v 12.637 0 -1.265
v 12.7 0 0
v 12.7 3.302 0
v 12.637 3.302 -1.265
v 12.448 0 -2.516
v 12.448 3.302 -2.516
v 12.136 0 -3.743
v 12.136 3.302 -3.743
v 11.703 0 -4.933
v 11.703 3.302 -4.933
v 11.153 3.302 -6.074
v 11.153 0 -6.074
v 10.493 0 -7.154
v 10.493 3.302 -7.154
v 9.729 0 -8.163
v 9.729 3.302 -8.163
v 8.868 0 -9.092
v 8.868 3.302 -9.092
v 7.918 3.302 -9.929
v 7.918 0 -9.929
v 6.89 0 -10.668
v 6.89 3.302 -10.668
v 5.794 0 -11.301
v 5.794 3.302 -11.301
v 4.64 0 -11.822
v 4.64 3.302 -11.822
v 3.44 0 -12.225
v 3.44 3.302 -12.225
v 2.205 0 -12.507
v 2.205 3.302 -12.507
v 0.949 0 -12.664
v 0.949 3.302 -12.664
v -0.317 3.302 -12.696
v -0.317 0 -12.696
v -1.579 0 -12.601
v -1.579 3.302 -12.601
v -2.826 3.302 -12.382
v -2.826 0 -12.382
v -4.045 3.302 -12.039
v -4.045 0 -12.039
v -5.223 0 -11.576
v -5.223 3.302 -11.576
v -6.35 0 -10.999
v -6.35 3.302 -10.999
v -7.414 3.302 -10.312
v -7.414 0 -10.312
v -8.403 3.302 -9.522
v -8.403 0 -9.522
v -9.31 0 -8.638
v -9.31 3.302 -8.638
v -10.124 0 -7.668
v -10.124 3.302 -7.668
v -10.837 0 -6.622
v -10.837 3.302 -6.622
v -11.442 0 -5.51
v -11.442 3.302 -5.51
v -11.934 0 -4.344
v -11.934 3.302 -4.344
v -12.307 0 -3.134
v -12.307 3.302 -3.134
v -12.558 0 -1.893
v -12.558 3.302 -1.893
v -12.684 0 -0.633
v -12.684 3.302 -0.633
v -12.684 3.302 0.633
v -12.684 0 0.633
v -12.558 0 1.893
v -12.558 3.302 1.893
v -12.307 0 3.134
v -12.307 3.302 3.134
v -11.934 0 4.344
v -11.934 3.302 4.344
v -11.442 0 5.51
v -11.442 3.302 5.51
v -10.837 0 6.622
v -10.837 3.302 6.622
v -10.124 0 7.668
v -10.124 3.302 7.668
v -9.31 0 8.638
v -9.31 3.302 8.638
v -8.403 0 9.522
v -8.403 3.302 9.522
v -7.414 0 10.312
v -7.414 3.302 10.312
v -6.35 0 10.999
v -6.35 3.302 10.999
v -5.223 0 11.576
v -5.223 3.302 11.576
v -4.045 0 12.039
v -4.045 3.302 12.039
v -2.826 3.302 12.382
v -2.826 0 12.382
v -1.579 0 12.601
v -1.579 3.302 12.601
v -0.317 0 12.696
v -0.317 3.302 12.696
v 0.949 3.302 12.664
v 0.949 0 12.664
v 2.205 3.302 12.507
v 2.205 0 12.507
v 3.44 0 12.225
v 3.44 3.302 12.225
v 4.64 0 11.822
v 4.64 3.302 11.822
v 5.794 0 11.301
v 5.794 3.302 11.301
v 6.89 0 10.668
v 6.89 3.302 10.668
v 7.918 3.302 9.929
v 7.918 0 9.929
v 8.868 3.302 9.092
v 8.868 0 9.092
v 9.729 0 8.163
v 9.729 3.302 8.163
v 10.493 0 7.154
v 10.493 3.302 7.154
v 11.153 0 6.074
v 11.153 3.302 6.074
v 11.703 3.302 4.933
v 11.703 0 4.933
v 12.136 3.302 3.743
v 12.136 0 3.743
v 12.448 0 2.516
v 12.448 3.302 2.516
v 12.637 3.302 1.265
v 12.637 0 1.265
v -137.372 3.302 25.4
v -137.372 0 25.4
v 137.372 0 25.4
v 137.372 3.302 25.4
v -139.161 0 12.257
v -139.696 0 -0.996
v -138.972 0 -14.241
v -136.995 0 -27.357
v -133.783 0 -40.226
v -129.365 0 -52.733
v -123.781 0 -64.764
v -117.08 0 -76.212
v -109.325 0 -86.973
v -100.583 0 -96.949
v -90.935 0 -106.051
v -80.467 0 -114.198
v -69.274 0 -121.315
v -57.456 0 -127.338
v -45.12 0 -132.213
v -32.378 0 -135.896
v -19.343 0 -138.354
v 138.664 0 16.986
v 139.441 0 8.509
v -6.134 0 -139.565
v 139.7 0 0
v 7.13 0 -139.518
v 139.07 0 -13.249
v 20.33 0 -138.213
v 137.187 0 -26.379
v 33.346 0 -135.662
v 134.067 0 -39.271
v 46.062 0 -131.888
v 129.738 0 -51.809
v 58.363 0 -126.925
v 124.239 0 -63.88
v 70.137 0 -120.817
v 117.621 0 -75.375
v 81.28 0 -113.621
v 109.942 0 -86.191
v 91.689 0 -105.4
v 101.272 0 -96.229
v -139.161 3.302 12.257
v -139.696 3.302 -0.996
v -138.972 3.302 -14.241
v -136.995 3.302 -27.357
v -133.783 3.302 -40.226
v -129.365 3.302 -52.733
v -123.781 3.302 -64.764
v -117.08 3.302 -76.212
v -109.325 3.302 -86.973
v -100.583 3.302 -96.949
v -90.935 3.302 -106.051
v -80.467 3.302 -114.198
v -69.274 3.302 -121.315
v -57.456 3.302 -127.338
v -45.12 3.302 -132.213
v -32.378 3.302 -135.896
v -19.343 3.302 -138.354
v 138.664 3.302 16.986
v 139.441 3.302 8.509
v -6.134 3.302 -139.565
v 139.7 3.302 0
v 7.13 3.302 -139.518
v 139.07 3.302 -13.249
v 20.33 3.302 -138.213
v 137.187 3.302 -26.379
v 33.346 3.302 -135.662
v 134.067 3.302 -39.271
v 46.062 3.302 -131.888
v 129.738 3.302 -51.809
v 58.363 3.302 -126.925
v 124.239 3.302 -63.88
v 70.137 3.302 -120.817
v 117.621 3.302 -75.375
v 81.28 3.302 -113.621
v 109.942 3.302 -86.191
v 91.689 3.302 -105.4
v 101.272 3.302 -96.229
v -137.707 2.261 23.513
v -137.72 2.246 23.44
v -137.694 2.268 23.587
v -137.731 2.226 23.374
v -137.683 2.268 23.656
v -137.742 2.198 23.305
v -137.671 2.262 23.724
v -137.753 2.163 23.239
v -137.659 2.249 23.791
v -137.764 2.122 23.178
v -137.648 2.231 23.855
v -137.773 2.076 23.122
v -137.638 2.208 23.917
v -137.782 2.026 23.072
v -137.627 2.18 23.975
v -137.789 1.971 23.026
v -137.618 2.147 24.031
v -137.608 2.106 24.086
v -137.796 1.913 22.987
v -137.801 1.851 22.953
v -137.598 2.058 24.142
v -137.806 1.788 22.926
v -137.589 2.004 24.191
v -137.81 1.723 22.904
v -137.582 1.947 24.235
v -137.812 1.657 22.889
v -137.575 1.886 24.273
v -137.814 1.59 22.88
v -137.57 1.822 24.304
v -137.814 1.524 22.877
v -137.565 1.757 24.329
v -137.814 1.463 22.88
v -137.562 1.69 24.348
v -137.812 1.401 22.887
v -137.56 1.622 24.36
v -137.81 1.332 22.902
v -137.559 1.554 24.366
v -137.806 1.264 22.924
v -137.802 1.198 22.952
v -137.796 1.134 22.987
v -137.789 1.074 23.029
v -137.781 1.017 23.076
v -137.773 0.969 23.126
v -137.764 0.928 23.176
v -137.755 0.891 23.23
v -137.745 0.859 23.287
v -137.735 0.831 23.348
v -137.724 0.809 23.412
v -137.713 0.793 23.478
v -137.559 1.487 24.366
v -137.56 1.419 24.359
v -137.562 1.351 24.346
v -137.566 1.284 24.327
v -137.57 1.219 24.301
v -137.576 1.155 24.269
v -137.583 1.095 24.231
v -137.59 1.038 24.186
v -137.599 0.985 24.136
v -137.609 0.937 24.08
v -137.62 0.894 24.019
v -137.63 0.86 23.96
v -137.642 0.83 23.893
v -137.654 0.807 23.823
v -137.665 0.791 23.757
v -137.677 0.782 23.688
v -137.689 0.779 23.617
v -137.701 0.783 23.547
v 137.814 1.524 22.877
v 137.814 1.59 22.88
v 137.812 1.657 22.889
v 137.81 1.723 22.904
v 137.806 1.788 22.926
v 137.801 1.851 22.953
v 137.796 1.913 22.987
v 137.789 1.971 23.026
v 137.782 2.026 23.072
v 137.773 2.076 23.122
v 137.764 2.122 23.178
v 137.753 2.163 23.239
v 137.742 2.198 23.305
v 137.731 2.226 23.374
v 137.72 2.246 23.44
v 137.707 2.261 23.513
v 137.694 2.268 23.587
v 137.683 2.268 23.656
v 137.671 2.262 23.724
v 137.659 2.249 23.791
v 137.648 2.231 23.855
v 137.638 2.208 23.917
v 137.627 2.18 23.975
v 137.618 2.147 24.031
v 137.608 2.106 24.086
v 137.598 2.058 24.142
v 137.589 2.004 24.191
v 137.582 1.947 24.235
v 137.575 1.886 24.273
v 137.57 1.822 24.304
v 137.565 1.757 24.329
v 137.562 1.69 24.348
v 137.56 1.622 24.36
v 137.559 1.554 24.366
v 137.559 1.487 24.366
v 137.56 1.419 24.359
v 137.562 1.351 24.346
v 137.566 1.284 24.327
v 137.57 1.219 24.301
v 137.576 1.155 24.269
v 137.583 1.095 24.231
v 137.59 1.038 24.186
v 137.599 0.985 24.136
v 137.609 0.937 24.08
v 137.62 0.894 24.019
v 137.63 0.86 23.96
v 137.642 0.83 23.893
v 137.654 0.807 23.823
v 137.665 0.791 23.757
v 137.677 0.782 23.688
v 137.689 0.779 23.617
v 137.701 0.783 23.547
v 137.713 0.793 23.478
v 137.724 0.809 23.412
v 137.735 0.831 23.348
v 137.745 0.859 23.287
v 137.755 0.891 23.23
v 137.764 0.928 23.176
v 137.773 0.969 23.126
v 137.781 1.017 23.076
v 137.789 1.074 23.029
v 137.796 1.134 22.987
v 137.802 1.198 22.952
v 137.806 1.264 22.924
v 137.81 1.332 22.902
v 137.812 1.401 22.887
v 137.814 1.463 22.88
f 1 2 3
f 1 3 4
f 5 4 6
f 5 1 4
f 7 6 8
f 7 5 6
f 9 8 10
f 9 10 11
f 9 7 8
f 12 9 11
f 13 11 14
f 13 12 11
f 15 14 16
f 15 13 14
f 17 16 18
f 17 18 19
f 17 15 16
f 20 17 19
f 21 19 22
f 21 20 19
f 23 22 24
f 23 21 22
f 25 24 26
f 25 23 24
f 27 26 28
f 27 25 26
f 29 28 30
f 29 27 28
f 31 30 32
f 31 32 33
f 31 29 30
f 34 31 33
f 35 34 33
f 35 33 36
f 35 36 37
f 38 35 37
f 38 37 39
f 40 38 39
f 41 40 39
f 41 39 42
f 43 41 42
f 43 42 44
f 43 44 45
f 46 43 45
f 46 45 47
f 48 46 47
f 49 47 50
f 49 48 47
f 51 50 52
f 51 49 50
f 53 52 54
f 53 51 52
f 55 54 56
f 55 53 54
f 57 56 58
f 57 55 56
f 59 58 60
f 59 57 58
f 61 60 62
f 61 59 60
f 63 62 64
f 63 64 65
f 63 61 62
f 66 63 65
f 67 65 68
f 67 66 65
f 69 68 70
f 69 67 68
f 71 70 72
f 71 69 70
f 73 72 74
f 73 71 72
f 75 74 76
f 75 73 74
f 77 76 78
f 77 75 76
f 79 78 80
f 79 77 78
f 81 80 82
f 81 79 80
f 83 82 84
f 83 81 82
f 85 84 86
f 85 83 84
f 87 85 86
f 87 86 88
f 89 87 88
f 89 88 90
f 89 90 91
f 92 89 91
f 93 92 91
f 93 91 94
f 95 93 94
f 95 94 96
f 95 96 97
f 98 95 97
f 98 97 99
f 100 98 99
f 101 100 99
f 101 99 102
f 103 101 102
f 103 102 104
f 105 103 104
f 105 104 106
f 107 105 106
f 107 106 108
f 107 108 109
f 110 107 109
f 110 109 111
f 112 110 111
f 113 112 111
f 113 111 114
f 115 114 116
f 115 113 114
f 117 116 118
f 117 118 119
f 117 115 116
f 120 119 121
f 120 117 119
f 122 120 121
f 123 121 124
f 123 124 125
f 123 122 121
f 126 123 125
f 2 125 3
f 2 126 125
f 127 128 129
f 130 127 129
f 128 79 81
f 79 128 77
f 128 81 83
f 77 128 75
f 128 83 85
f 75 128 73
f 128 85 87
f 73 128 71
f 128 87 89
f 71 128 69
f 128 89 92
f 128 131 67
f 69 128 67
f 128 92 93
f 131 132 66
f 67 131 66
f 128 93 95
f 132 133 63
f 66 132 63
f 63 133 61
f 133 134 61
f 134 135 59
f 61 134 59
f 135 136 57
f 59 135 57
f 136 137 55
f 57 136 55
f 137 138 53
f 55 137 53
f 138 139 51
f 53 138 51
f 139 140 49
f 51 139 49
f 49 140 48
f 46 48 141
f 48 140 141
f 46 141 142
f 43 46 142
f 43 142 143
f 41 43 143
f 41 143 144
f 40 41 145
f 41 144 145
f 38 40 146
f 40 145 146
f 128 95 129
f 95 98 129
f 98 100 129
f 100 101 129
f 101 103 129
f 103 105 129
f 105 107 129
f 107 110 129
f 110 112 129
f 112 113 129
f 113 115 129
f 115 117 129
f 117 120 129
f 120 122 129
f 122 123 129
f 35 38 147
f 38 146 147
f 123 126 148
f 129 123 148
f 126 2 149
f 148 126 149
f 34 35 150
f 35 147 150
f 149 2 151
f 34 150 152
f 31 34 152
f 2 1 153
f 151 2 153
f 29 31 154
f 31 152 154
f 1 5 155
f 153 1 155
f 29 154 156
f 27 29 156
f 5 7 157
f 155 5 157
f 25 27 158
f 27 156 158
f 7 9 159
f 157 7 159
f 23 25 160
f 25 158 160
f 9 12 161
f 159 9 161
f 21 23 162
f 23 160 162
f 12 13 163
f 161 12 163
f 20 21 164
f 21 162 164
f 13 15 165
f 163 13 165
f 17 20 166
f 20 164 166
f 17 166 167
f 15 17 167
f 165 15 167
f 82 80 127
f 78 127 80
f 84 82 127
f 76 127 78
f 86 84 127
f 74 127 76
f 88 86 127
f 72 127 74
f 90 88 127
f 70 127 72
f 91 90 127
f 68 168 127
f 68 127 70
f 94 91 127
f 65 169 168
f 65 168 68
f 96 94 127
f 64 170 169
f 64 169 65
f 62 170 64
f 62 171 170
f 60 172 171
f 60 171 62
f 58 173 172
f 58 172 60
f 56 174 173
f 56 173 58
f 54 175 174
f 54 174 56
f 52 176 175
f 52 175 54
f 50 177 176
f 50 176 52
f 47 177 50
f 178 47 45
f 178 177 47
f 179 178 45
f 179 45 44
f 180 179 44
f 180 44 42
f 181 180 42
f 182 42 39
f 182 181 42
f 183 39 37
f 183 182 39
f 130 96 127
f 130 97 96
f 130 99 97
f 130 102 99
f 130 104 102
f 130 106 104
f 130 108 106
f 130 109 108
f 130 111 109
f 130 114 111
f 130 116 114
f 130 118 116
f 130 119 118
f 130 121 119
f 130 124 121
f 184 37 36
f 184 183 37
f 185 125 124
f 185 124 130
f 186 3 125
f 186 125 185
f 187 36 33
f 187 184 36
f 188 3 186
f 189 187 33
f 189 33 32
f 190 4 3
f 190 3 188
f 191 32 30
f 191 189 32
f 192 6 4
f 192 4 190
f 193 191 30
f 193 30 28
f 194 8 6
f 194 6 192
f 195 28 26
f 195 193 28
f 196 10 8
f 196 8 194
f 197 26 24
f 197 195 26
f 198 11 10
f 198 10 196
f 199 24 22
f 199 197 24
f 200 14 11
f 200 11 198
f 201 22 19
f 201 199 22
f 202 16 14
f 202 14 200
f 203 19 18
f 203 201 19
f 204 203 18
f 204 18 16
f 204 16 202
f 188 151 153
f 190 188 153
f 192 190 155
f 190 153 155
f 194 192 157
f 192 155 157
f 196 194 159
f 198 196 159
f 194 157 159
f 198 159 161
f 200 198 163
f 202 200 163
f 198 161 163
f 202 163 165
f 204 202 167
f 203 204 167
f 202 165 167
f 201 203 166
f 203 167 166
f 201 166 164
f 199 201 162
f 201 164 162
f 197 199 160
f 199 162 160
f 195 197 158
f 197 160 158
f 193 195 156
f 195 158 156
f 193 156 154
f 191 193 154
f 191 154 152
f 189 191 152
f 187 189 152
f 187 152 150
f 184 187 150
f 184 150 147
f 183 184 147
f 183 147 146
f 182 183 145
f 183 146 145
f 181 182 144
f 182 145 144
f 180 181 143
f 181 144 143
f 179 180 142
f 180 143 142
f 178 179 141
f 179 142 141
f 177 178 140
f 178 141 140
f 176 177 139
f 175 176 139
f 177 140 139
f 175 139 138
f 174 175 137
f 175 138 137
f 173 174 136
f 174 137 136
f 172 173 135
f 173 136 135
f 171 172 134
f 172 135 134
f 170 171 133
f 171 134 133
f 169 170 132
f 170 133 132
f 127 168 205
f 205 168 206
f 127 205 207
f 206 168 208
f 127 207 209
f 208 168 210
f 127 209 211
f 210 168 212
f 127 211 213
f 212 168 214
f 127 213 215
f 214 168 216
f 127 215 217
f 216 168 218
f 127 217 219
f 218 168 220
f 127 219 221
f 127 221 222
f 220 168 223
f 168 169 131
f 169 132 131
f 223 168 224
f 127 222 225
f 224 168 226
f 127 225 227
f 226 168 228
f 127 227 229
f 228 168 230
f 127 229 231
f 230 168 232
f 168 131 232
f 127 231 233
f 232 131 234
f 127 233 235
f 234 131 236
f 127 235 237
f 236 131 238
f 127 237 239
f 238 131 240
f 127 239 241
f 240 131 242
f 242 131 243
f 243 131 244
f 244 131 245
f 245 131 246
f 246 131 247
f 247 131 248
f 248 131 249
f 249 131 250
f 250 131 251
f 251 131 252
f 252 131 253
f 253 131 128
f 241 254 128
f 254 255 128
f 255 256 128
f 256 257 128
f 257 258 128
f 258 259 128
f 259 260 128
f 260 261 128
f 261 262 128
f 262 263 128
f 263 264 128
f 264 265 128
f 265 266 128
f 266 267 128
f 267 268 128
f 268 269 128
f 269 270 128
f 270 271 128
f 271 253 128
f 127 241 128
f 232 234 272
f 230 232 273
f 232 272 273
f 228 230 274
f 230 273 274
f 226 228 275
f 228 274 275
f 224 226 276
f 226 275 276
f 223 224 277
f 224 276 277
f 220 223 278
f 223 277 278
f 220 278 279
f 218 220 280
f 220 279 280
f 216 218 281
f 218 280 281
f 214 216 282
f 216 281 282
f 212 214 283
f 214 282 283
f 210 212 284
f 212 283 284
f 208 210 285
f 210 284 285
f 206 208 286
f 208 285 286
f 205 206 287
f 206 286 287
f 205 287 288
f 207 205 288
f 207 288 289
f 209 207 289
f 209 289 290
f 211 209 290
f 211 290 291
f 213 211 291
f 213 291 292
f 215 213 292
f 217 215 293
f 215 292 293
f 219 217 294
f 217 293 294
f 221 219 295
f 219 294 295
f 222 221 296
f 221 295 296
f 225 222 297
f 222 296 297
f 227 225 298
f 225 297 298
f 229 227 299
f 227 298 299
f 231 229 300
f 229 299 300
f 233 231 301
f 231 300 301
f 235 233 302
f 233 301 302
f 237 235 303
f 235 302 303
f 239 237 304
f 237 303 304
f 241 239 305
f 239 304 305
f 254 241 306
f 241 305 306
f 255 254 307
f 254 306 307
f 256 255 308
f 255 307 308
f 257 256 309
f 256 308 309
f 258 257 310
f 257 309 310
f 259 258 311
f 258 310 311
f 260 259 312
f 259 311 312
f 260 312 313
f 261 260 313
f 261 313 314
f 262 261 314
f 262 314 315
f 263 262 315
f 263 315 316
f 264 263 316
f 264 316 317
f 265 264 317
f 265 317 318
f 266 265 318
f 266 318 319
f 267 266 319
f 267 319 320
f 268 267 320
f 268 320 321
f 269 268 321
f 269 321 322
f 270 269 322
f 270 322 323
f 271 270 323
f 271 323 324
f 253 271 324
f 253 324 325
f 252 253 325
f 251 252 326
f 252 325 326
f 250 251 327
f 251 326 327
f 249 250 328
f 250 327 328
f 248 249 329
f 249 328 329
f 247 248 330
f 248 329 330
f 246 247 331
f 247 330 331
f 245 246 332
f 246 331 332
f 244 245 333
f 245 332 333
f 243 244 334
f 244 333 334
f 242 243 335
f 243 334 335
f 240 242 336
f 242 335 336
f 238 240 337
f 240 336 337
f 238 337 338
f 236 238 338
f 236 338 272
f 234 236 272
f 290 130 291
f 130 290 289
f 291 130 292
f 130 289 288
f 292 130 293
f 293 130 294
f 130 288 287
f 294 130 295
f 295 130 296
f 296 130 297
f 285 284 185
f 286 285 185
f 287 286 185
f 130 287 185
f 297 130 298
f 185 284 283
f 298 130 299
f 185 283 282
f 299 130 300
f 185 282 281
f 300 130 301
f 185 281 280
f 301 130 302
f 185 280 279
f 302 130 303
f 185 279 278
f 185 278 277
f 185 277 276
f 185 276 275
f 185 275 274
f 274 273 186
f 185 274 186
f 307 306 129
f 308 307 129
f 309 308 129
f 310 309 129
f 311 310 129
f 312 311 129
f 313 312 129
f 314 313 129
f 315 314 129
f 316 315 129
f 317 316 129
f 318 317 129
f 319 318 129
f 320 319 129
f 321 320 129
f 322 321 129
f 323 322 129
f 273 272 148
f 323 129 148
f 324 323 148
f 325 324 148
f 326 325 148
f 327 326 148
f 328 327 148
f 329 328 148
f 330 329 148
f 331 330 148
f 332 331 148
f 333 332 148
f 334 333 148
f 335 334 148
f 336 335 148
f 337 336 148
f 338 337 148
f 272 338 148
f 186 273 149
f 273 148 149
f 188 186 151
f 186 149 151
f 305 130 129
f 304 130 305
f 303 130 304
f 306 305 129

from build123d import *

# Parameters (mm, degrees)
SKETCH1_R               = 12.7
BOSS_EXTRUDE2_DEPTH     = 3.302
SKETCH4_R               = 0.744786443
CUT_EXTRUDE4_DEPTH      = 140.7
CUT_EXTRUDE4_DEPTH_BACK = 140.7


with BuildPart() as part:
    # Sketch1 → Boss-Extrude2 (new body)
    with BuildSketch(Plane(origin=(0, 0, 0), x_dir=(1, 0, 0), z_dir=(0, 1, 0))):
        with BuildLine():
            ThreePointArc((139.7, 0), (-12.753253462, 139.116657975), (-137.371503595, -25.4))
            Line((-137.371503595, -25.4), (137.371503595, -25.4))
            ThreePointArc((137.371503595, -25.4), (139.116657975, -12.753253462), (139.7, 0))
        make_face()
        Circle(SKETCH1_R, mode=Mode.SUBTRACT)
    extrude(amount=BOSS_EXTRUDE2_DEPTH)

    # Sketch4 → Cut-Extrude4 (cut, two sides)
    with BuildSketch(Plane(origin=(0, 0, 0), x_dir=(0, 0, -1), z_dir=(1, 0, 0))) as cut_extrude4_sk:
        with Locations((-23.622, 1.524)):
            Circle(SKETCH4_R)
    extrude(amount=CUT_EXTRUDE4_DEPTH, mode=Mode.SUBTRACT)
    extrude(cut_extrude4_sk.sketch, amount=-CUT_EXTRUDE4_DEPTH_BACK, mode=Mode.SUBTRACT)


solid = part.part
